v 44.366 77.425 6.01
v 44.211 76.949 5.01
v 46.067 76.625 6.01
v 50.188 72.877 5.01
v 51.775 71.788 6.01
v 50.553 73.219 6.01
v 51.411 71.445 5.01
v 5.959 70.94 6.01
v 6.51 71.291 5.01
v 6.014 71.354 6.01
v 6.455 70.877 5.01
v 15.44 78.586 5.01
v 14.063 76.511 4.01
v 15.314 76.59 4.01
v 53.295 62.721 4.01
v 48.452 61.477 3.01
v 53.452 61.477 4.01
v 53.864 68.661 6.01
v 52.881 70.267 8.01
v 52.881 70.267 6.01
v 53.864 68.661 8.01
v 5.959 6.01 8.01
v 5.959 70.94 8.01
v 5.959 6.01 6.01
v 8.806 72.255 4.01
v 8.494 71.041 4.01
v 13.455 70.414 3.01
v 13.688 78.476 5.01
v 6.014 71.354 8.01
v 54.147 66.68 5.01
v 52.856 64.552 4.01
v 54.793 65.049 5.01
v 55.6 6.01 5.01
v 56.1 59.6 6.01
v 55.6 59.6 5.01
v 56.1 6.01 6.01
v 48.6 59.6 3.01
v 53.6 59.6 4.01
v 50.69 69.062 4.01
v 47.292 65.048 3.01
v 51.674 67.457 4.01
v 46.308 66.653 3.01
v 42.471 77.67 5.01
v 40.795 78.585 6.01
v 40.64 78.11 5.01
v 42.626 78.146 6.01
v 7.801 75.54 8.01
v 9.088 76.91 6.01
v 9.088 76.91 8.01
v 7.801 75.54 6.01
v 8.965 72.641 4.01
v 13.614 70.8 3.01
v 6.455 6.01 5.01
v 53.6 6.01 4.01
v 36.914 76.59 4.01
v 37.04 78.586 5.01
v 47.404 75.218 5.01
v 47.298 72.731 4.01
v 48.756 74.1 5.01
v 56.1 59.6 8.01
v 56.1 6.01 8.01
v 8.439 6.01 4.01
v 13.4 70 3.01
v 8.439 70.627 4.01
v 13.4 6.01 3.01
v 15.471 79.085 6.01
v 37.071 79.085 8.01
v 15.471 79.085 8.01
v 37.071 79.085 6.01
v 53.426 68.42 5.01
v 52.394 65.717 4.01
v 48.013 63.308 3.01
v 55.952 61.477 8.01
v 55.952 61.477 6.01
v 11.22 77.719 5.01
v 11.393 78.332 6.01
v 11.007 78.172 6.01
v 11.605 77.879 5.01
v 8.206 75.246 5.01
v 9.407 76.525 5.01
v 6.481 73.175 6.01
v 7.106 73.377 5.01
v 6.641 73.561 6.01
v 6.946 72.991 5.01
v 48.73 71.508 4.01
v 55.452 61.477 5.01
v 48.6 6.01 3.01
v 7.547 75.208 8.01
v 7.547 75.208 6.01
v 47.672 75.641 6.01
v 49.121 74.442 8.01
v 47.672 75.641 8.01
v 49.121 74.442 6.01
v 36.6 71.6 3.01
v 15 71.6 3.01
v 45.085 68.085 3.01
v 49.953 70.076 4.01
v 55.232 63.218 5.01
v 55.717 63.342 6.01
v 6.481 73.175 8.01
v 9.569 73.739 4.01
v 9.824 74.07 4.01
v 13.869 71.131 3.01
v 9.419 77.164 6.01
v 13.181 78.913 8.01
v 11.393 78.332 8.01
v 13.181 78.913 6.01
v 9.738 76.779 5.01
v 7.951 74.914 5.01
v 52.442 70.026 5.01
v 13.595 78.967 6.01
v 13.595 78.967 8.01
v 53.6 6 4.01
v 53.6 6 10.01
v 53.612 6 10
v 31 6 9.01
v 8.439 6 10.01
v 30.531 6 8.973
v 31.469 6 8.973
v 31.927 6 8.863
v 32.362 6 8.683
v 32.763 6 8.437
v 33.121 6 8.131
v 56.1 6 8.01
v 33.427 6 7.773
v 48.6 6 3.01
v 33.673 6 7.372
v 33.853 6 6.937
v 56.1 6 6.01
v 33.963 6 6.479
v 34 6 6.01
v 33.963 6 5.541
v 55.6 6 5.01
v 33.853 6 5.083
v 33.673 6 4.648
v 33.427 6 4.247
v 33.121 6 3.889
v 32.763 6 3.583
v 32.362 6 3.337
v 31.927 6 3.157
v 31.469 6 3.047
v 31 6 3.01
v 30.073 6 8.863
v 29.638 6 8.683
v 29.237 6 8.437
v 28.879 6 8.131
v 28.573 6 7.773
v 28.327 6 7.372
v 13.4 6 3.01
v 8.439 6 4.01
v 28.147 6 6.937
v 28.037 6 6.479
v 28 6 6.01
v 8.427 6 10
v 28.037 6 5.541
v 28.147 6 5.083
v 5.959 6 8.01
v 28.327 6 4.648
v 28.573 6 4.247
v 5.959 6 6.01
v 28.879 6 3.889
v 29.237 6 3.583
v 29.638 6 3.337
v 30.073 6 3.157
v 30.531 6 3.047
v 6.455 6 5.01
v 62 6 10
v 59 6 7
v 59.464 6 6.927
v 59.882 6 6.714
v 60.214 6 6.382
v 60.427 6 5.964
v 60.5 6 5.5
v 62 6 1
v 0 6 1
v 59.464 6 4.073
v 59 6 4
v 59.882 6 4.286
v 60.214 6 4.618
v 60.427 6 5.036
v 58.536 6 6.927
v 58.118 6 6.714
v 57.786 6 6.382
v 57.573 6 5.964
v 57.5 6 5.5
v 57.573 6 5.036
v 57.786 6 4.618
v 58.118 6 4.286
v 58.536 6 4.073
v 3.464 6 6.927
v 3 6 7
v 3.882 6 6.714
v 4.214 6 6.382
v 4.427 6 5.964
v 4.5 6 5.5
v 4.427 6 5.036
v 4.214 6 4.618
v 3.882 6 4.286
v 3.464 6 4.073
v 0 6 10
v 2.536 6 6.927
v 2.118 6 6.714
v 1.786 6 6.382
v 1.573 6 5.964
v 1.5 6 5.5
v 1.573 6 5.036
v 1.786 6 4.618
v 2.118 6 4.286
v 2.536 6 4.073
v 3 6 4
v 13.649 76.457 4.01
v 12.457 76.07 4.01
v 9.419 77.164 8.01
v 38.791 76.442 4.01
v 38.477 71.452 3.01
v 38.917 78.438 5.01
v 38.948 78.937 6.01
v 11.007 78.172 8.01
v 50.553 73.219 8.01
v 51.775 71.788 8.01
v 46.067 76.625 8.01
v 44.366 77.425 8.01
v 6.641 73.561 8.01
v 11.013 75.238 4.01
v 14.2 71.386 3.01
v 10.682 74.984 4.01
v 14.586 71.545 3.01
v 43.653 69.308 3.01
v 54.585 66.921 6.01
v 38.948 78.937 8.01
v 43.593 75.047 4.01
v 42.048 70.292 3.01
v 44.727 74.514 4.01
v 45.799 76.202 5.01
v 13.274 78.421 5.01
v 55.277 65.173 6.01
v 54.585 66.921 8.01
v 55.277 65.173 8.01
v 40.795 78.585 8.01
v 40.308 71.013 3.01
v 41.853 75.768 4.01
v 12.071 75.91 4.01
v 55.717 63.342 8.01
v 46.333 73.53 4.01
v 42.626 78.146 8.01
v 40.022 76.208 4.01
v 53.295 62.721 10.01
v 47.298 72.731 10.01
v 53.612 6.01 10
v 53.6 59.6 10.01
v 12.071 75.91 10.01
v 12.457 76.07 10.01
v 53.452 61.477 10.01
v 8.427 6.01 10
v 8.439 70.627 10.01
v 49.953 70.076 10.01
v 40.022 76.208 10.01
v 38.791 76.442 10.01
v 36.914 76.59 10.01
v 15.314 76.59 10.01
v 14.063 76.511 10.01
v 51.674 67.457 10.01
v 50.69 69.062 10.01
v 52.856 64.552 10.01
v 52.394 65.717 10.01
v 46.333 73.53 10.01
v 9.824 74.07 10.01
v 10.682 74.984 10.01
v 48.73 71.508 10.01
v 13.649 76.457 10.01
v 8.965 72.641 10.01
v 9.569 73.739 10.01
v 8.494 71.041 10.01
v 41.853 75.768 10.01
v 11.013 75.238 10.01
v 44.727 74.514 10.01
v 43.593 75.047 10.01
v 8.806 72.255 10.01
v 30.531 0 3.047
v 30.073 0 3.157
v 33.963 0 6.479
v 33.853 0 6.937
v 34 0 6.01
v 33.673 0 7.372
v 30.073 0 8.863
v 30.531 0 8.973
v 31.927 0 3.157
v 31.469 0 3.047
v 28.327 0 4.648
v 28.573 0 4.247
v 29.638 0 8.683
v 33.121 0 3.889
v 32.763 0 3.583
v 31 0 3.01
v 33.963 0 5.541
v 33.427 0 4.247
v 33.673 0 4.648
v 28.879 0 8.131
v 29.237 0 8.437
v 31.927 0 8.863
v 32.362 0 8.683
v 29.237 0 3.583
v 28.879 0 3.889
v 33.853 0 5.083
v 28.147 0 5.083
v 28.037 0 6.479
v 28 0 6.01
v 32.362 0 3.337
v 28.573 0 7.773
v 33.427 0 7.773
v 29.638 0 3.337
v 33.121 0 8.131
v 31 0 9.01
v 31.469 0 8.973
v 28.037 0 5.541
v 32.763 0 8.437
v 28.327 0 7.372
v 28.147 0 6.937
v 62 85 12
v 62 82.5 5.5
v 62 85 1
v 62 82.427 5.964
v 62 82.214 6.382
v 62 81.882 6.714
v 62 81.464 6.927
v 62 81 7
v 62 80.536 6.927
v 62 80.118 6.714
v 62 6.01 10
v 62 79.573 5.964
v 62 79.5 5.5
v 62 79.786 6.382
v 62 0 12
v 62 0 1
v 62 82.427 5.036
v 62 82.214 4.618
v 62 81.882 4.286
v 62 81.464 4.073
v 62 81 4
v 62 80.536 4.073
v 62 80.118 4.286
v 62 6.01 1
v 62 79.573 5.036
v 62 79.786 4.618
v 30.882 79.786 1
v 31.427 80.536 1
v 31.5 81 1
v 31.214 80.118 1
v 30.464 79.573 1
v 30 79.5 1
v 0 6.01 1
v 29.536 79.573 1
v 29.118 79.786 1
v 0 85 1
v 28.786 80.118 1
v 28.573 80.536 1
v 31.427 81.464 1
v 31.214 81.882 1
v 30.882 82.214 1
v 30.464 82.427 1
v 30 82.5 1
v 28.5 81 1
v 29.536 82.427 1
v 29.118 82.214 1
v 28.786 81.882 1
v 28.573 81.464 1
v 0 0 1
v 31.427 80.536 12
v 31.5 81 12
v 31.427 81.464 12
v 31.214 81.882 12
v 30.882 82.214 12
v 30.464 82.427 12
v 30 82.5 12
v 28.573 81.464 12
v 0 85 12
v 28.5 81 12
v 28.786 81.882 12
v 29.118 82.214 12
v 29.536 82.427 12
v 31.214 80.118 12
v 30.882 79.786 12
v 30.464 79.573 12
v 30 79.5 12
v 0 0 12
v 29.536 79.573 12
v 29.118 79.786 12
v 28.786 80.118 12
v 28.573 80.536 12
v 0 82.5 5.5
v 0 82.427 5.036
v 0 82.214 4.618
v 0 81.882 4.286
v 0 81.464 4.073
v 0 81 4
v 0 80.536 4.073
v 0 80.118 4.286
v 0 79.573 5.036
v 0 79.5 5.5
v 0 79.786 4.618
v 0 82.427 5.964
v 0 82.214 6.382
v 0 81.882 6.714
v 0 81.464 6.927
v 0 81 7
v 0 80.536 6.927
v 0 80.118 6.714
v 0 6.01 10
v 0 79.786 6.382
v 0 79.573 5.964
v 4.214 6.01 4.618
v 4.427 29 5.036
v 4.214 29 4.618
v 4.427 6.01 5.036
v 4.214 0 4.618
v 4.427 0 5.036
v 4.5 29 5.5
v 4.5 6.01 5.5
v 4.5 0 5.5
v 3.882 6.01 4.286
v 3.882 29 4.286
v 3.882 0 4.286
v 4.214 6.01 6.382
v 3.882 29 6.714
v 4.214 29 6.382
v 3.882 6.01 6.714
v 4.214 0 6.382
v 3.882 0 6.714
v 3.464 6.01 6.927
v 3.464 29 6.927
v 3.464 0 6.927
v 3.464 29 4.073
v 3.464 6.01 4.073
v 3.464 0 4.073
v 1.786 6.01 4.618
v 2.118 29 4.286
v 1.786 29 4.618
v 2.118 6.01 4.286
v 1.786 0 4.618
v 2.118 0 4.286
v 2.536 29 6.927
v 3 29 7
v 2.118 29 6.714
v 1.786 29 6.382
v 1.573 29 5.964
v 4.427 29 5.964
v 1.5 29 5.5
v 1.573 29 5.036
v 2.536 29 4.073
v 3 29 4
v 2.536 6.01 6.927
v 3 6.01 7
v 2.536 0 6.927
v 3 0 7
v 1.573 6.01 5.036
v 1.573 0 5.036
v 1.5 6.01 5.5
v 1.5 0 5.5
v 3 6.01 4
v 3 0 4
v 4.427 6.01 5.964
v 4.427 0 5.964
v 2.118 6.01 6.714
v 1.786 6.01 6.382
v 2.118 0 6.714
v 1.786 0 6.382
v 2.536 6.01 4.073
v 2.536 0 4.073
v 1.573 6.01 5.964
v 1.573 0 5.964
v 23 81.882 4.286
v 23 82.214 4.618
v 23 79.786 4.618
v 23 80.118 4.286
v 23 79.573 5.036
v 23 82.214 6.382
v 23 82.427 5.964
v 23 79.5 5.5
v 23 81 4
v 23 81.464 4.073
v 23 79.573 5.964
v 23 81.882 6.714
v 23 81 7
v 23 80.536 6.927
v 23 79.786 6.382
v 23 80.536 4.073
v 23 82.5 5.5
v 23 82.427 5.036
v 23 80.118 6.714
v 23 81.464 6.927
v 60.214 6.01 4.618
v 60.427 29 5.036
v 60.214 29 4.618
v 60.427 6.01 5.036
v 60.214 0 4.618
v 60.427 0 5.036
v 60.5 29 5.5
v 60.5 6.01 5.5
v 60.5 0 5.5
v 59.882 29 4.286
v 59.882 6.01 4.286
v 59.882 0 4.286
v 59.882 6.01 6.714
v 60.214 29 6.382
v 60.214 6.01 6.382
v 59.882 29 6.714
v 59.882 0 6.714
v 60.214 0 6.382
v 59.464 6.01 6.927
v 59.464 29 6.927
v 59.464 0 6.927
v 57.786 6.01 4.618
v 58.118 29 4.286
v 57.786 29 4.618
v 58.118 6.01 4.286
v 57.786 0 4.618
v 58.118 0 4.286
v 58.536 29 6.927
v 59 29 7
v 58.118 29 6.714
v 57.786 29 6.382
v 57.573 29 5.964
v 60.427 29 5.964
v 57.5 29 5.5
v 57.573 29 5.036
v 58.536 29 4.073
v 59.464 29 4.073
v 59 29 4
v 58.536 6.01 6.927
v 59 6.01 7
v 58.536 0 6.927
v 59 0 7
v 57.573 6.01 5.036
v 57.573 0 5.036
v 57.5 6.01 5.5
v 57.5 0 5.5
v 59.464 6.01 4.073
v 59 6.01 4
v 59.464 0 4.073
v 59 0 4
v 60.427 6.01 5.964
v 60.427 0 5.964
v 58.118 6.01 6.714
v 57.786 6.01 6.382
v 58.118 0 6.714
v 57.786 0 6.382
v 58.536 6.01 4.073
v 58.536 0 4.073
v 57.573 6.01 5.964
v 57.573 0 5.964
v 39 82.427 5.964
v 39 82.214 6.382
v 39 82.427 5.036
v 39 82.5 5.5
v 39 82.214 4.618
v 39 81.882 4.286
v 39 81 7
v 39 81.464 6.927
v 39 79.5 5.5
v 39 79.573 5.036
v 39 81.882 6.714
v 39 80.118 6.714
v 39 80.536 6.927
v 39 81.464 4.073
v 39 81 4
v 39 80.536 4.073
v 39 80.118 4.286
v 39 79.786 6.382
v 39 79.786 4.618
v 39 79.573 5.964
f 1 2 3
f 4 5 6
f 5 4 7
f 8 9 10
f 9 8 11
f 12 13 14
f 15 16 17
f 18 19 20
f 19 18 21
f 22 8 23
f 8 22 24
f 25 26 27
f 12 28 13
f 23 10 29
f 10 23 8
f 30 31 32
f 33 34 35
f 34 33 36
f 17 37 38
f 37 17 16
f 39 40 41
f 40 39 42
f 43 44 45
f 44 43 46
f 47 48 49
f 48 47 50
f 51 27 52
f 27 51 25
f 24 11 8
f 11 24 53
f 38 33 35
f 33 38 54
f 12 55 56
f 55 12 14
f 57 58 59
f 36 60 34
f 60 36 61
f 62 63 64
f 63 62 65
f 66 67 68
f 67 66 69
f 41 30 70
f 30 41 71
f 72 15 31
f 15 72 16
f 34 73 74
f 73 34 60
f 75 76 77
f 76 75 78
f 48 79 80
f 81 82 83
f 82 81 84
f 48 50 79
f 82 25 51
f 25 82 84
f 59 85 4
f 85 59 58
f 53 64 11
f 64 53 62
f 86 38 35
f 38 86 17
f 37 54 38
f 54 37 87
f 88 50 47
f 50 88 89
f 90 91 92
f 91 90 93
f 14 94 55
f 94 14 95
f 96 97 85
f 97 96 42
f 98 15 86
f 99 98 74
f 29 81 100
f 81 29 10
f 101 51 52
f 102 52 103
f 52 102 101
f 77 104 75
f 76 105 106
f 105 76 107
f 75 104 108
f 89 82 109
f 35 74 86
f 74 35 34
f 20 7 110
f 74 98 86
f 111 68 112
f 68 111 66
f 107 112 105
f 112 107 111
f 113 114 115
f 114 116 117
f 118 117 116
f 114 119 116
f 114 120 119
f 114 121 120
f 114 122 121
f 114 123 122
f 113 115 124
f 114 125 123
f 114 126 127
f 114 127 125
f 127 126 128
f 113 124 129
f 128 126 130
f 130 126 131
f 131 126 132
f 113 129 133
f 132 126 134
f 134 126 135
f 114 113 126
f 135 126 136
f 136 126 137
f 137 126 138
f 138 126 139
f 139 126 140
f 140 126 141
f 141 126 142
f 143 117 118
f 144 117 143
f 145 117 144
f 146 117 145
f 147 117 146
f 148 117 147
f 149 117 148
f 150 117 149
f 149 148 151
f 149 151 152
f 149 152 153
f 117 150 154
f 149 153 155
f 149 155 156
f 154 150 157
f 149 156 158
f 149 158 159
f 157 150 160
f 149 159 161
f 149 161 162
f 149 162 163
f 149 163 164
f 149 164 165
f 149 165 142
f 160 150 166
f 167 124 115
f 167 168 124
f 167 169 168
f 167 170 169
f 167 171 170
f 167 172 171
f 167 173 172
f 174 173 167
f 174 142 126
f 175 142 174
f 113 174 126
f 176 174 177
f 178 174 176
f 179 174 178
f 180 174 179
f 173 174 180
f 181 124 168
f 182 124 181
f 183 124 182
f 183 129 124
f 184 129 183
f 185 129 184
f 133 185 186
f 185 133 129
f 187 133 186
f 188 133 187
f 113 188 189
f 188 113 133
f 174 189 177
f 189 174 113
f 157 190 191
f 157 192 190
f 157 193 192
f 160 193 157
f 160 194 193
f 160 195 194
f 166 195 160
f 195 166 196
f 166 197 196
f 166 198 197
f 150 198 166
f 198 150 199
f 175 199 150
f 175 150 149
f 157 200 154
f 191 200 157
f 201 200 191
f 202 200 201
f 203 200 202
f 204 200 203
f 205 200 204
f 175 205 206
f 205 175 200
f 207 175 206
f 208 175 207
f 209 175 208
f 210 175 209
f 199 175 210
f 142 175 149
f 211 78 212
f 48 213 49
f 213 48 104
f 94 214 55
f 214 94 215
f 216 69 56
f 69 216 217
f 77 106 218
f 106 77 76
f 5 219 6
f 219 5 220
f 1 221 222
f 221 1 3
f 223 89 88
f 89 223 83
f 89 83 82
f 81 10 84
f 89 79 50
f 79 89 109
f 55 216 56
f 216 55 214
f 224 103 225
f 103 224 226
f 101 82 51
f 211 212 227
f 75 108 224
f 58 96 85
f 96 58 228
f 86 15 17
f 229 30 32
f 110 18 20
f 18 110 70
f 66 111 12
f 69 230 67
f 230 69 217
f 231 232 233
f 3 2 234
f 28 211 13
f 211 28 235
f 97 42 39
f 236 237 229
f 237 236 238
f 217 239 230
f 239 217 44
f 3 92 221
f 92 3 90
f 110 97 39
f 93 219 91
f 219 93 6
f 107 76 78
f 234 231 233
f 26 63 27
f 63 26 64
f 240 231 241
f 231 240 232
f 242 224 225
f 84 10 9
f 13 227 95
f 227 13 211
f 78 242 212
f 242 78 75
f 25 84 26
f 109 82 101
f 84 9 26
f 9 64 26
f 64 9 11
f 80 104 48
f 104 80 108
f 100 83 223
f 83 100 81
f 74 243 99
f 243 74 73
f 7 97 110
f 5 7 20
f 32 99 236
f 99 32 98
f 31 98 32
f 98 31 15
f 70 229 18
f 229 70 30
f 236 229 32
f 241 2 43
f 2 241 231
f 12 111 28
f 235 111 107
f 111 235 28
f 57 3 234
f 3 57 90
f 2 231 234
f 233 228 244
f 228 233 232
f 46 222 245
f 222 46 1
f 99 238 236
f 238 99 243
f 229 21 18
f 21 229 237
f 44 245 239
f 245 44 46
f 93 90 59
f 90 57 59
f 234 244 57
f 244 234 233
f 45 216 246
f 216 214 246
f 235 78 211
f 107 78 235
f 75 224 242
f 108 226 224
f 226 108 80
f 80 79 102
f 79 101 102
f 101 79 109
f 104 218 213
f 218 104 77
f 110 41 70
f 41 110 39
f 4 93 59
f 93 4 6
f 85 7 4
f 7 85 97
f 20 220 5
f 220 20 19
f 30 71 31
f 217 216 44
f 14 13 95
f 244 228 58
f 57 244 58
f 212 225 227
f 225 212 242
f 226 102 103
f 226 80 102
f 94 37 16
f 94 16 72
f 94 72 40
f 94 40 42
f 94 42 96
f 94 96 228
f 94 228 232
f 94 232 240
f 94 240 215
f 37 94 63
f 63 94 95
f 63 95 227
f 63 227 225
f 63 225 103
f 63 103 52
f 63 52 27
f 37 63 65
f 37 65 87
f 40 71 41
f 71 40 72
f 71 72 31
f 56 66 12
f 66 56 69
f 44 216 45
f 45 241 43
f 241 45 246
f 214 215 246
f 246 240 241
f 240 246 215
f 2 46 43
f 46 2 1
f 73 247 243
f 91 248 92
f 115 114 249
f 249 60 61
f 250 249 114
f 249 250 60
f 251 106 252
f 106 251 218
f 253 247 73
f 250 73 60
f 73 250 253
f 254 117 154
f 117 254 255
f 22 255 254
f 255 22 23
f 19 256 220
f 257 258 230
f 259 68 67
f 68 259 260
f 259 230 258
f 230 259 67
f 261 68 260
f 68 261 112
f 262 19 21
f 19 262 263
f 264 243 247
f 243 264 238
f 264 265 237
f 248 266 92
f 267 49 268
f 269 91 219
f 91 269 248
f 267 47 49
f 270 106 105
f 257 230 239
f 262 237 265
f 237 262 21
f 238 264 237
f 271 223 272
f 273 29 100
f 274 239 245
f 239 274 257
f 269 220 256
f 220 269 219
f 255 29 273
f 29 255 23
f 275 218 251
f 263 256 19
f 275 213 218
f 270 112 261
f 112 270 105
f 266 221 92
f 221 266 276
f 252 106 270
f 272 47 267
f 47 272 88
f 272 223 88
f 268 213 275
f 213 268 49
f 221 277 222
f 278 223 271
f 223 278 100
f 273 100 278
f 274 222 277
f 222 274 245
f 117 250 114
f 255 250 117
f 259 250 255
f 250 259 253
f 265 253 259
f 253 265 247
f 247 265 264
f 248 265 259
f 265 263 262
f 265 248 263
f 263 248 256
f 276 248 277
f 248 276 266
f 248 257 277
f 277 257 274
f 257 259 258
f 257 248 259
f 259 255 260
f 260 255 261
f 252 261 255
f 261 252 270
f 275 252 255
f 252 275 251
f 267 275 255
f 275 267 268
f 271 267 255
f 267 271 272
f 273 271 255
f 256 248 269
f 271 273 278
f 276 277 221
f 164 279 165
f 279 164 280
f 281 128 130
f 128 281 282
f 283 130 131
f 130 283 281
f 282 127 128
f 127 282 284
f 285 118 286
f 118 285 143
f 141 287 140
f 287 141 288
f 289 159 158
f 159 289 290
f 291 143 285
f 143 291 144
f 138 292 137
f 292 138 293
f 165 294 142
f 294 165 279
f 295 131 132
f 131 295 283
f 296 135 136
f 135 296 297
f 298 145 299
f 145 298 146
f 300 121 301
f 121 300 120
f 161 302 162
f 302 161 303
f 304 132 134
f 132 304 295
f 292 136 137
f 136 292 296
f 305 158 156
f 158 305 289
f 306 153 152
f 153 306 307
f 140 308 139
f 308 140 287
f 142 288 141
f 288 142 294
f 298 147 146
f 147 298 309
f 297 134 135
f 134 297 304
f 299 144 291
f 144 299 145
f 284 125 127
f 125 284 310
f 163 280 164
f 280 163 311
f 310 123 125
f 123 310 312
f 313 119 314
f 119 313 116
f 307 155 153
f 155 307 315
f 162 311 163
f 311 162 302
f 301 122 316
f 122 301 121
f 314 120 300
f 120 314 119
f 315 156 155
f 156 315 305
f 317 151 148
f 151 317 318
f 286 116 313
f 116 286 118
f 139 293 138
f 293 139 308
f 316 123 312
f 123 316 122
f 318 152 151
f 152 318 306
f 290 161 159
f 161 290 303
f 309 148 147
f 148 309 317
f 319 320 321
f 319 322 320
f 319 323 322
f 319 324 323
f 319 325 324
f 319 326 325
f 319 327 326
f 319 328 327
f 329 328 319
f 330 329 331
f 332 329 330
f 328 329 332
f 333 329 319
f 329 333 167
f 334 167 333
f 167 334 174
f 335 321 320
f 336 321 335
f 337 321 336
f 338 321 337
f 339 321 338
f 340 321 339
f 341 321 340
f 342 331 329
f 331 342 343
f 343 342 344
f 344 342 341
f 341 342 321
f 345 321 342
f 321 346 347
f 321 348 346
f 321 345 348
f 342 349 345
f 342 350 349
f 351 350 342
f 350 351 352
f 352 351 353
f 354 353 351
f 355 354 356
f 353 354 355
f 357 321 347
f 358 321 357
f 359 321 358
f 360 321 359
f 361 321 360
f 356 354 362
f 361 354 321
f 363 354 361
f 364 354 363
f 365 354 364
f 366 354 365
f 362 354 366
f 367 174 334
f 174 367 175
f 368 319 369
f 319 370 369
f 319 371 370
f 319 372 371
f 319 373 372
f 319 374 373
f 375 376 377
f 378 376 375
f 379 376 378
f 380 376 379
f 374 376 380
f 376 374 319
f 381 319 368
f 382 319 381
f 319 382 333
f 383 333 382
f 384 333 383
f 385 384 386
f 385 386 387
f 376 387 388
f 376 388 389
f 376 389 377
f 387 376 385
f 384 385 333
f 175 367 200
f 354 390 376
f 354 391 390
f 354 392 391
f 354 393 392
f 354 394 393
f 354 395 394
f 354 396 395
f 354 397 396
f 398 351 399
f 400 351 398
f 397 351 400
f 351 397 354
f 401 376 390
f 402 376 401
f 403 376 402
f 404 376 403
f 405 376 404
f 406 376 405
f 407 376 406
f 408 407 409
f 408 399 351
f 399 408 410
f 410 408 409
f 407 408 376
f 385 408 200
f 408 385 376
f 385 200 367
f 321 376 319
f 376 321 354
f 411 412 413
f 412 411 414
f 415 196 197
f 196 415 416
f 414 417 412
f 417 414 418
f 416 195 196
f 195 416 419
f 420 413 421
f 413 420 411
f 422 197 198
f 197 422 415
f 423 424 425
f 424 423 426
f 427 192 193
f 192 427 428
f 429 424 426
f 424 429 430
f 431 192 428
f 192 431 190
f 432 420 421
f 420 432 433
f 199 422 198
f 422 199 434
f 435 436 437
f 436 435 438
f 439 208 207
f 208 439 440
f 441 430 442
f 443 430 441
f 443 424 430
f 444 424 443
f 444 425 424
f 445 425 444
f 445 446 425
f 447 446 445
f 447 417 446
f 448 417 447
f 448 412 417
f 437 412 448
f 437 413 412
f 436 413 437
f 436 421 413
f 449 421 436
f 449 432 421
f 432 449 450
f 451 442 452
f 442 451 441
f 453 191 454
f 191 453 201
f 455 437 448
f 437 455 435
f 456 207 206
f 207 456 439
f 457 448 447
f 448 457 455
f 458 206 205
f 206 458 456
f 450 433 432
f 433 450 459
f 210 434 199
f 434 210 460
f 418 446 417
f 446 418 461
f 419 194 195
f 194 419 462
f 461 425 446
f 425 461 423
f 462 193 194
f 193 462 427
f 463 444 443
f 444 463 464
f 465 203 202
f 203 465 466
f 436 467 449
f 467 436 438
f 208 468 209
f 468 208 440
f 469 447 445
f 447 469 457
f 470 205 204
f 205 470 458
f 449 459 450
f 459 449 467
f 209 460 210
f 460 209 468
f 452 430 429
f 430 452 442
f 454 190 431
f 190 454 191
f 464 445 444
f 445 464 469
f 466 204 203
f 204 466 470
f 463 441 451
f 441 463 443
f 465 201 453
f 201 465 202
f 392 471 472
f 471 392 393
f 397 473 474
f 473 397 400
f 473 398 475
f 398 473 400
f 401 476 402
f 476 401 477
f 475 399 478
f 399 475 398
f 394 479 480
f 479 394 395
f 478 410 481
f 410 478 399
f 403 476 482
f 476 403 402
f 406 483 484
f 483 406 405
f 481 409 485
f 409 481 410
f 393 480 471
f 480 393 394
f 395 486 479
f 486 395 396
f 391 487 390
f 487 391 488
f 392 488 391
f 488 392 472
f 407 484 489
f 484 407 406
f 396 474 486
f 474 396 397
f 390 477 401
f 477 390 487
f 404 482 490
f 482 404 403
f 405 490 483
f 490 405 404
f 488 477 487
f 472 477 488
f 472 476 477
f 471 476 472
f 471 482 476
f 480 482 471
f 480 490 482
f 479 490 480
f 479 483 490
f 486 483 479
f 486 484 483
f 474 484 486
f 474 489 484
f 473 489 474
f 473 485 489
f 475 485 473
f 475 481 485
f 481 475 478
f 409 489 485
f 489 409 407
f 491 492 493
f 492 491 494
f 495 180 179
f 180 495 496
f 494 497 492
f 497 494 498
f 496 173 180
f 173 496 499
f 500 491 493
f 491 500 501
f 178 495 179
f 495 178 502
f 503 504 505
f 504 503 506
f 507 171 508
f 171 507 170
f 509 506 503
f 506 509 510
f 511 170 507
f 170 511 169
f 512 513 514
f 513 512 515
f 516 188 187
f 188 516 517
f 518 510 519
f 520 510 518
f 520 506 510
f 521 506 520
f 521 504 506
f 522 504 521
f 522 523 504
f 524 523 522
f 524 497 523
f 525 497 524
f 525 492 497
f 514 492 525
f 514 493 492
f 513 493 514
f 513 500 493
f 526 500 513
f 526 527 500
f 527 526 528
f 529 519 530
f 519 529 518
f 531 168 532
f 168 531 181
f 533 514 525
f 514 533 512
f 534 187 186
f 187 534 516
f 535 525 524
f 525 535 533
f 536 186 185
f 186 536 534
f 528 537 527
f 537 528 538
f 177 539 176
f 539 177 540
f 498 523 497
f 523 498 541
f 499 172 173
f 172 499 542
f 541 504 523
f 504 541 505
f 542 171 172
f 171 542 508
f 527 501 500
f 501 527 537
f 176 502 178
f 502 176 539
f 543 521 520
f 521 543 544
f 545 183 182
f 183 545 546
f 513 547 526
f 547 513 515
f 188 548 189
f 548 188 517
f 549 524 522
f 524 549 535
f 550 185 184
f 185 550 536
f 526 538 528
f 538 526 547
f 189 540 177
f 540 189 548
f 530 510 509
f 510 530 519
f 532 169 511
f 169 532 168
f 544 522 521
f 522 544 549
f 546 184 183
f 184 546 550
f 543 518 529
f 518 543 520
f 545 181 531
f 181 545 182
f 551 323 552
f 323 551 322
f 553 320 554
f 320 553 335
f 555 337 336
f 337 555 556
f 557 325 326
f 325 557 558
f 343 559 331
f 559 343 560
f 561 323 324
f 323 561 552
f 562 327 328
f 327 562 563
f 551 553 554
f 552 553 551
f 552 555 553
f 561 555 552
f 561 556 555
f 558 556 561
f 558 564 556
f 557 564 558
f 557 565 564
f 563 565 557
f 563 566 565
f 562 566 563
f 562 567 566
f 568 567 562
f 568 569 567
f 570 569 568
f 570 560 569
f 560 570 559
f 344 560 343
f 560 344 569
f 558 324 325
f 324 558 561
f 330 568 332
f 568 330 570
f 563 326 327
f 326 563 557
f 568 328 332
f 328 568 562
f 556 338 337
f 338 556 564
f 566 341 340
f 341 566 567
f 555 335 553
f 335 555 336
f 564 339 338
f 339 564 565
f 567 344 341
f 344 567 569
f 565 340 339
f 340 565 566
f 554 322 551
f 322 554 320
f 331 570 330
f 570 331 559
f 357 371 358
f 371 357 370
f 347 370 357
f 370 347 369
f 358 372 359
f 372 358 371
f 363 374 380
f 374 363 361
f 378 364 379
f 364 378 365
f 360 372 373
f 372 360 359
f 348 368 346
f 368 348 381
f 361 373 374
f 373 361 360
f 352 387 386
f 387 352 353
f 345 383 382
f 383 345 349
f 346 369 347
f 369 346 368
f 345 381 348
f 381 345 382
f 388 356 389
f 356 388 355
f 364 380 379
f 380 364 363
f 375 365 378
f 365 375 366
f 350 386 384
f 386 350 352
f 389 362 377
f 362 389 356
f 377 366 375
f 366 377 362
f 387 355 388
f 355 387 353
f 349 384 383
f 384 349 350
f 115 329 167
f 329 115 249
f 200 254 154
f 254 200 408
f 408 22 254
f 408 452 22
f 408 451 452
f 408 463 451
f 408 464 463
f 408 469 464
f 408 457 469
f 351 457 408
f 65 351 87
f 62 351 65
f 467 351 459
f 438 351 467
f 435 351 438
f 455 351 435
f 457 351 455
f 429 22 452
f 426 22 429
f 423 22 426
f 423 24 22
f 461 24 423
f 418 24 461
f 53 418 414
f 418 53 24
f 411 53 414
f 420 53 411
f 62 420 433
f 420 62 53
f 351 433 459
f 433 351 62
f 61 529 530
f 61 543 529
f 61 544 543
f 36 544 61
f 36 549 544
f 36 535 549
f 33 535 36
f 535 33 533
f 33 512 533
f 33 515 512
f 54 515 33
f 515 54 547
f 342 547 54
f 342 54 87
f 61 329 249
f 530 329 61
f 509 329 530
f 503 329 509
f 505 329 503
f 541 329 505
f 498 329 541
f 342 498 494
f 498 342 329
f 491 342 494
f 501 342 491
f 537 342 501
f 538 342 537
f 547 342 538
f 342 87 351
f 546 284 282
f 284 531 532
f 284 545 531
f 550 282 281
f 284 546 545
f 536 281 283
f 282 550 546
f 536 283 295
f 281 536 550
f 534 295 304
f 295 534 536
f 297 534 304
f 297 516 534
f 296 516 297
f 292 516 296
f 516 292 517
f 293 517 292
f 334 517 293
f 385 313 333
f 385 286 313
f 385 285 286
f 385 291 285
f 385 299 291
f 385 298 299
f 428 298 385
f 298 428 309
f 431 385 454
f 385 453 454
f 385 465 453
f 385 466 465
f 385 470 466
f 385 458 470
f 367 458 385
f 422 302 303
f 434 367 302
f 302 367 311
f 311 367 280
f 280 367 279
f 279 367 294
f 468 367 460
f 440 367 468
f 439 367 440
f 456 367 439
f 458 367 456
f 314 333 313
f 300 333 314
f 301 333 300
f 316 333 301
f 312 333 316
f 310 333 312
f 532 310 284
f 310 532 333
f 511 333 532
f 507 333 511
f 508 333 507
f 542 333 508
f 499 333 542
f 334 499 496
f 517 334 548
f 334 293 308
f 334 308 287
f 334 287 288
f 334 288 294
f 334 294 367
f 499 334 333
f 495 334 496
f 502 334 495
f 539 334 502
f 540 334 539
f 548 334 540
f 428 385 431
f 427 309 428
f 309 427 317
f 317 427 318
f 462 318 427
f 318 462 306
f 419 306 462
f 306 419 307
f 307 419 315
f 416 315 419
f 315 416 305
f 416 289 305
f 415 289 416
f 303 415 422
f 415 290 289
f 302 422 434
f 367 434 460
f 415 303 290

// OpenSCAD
inverse=1;
part="mold1";
if(part=="mold0")
{
  spatula_mink(1);
}
if(part=="mold1")
{
  mold_left();
  mold_mid();
  mold_right();
  mold_top();
} else if(part=="mold2") {
  rotate([0,-90]) mold_left();
  translate([10,20]) rotate([-90,0]) translate([-10,-85]) mold_mid();
  translate([62,0]) rotate([0,90]) translate([-62,0]) mold_right();
  rotate([90,0]) mold_top();
}
module mold_top() {
  intersection() {
    spatula_mink(1);
    color("blue") union() {
      translate([0,0,10]) cube([64,86,4]);
      cube([64,6,11]);
    }
  }
}
module mold_left() {
  intersection() {
    spatula_mink(1);
    translate([0,6.01]) cube([10,88,10]);
  }
}
module mold_mid() {
  intersection(){
    spatula_mink(1);
    translate([10,6.01]) cube([42,88,10]);
  }
}
module mold_right() {
  intersection(){
    spatula_mink(1);
    translate([52,6.01]) cube([20,88,10]);
  }
}

*translate([50,0]) spatula_old(inverse);
module spatula_mink(inverse=0) {
  difference() {
    translate([15,6,5])
      mirror([0,0,inverse]) diffif(inverse) {
        translate([-15,-7,-7]) cube([62,86,11]);
        translate([0,0,inverse?-3.01:0]) union() {
          difference() {
          minkowski() {
            linear_extrude(1) scale([0.8,0.8]) spatula_outline();
              intersection() {
            union() {
                //cylinder(d=15,h=1,$fn=25);
                translate([0,0,1]) cylinder(d1=15,d2=14,h=1,$fn=25);
                translate([0,0,2]) cylinder(d1=14,d2=10,h=1,$fn=25);
                translate([0,0,3]) cylinder(d1=10,d2=0,h=1,$fn=25);
                mirror([0,0,1]) cylinder(d1=15,d2=10,h=2,$fn=25);
            }
                translate([-7.5,0,-5]) cube([15,7.5,13]);
              }
          }
        if(!inverse) translate([16,-.01,2]) rotate([-90,0]) cylinder(d=6,h=60,$fn=30);
        }
        if(inverse)
        translate([16,-10,2]) {
          rotate([-90,0]) cylinder(d=6,h=20,$fn=40);
          *translate([-3,3,-14]) cube([6,8,14]);
        }
      }
    }
    if(inverse)
    {
      translate([3,-1,5.5]) rotate([-90,0]) cylinder(d=3,h=30,$fn=20);
      translate([-1,81,5.5]) rotate([0,90,0]) cylinder(d=3,h=24,$fn=20);
      translate([59,-1,5.5]) rotate([-90,0]) cylinder(d=3,h=30,$fn=20);
      translate([63,81,5.5]) rotate([0,-90]) cylinder(d=3,h=24,$fn=20);
      translate([30,81,-.01]) cylinder(d=3,h=20,$fn=20);
    }
  }
}
module spatula_old(inverse=0) {
mirror([0,0,inverse]) diffif(inverse) {
  translate([-5,-3,-3.99]) cube([50,90,9]);
  union(){
  difference() {
    translate([0,0,-4]) linear_extrude(8,convexity=5) spatula_outline();
    if(!inverse) translate([20,-.01]) rotate([-90,0]) cylinder(d=6,h=60,$fn=30);
    translate([0,0,-.5]) for(m=[0,1]) mirror([0,0,m]) translate([0,0,.5]) {
    translate([-6,82]) rotate([-15-(m*30),0]) mirror([0,1,0]) cube([50,50,10]);
    translate([42,-5]) rotate([0,15+(m*30)]) mirror([1,0]) cube([50,90,10]);
    translate([-2,-5]) rotate([0,-15-(m*30)]) cube([50,90,10]);
      translate([0,82]) rotate([0,0,45]) rotate([-11-(m*30),0]) mirror([0,1,0]) translate([-25,0]) cube([50,50,10]);
      translate([40,81]) rotate([0,0,-45]) rotate([-11-(m*30),0]) mirror([0,1,0]) translate([-25,0]) cube([50,50,10]);
    }
  }
  if(inverse)
  translate([20,-10,-1]) {
    rotate([-90,0]) cylinder(d=6,h=20,$fn=40);
    translate([-3,3,-14]) cube([6,8,14]);
  }
}
}
}
module diffif(cond=1)
{
    if(cond>0)
      difference() {
        children(0);
        children(1);
      }
    else
      children(1);
}
module spatula_outline() {
  
      //square([35,75]);
      //*
      //translate([-2,0]) square([2,80]);
      hull() {
      translate([0,80]) circle(d=4,$fn=24);
      translate([27,67]) circle(d=30,$fn=40);
      translate([-2,0]) square([44,1]);
      }
      //translate([35,0]) square([7,72]);
      //translate([0,75]) square([32,7]);
  //*/
}
